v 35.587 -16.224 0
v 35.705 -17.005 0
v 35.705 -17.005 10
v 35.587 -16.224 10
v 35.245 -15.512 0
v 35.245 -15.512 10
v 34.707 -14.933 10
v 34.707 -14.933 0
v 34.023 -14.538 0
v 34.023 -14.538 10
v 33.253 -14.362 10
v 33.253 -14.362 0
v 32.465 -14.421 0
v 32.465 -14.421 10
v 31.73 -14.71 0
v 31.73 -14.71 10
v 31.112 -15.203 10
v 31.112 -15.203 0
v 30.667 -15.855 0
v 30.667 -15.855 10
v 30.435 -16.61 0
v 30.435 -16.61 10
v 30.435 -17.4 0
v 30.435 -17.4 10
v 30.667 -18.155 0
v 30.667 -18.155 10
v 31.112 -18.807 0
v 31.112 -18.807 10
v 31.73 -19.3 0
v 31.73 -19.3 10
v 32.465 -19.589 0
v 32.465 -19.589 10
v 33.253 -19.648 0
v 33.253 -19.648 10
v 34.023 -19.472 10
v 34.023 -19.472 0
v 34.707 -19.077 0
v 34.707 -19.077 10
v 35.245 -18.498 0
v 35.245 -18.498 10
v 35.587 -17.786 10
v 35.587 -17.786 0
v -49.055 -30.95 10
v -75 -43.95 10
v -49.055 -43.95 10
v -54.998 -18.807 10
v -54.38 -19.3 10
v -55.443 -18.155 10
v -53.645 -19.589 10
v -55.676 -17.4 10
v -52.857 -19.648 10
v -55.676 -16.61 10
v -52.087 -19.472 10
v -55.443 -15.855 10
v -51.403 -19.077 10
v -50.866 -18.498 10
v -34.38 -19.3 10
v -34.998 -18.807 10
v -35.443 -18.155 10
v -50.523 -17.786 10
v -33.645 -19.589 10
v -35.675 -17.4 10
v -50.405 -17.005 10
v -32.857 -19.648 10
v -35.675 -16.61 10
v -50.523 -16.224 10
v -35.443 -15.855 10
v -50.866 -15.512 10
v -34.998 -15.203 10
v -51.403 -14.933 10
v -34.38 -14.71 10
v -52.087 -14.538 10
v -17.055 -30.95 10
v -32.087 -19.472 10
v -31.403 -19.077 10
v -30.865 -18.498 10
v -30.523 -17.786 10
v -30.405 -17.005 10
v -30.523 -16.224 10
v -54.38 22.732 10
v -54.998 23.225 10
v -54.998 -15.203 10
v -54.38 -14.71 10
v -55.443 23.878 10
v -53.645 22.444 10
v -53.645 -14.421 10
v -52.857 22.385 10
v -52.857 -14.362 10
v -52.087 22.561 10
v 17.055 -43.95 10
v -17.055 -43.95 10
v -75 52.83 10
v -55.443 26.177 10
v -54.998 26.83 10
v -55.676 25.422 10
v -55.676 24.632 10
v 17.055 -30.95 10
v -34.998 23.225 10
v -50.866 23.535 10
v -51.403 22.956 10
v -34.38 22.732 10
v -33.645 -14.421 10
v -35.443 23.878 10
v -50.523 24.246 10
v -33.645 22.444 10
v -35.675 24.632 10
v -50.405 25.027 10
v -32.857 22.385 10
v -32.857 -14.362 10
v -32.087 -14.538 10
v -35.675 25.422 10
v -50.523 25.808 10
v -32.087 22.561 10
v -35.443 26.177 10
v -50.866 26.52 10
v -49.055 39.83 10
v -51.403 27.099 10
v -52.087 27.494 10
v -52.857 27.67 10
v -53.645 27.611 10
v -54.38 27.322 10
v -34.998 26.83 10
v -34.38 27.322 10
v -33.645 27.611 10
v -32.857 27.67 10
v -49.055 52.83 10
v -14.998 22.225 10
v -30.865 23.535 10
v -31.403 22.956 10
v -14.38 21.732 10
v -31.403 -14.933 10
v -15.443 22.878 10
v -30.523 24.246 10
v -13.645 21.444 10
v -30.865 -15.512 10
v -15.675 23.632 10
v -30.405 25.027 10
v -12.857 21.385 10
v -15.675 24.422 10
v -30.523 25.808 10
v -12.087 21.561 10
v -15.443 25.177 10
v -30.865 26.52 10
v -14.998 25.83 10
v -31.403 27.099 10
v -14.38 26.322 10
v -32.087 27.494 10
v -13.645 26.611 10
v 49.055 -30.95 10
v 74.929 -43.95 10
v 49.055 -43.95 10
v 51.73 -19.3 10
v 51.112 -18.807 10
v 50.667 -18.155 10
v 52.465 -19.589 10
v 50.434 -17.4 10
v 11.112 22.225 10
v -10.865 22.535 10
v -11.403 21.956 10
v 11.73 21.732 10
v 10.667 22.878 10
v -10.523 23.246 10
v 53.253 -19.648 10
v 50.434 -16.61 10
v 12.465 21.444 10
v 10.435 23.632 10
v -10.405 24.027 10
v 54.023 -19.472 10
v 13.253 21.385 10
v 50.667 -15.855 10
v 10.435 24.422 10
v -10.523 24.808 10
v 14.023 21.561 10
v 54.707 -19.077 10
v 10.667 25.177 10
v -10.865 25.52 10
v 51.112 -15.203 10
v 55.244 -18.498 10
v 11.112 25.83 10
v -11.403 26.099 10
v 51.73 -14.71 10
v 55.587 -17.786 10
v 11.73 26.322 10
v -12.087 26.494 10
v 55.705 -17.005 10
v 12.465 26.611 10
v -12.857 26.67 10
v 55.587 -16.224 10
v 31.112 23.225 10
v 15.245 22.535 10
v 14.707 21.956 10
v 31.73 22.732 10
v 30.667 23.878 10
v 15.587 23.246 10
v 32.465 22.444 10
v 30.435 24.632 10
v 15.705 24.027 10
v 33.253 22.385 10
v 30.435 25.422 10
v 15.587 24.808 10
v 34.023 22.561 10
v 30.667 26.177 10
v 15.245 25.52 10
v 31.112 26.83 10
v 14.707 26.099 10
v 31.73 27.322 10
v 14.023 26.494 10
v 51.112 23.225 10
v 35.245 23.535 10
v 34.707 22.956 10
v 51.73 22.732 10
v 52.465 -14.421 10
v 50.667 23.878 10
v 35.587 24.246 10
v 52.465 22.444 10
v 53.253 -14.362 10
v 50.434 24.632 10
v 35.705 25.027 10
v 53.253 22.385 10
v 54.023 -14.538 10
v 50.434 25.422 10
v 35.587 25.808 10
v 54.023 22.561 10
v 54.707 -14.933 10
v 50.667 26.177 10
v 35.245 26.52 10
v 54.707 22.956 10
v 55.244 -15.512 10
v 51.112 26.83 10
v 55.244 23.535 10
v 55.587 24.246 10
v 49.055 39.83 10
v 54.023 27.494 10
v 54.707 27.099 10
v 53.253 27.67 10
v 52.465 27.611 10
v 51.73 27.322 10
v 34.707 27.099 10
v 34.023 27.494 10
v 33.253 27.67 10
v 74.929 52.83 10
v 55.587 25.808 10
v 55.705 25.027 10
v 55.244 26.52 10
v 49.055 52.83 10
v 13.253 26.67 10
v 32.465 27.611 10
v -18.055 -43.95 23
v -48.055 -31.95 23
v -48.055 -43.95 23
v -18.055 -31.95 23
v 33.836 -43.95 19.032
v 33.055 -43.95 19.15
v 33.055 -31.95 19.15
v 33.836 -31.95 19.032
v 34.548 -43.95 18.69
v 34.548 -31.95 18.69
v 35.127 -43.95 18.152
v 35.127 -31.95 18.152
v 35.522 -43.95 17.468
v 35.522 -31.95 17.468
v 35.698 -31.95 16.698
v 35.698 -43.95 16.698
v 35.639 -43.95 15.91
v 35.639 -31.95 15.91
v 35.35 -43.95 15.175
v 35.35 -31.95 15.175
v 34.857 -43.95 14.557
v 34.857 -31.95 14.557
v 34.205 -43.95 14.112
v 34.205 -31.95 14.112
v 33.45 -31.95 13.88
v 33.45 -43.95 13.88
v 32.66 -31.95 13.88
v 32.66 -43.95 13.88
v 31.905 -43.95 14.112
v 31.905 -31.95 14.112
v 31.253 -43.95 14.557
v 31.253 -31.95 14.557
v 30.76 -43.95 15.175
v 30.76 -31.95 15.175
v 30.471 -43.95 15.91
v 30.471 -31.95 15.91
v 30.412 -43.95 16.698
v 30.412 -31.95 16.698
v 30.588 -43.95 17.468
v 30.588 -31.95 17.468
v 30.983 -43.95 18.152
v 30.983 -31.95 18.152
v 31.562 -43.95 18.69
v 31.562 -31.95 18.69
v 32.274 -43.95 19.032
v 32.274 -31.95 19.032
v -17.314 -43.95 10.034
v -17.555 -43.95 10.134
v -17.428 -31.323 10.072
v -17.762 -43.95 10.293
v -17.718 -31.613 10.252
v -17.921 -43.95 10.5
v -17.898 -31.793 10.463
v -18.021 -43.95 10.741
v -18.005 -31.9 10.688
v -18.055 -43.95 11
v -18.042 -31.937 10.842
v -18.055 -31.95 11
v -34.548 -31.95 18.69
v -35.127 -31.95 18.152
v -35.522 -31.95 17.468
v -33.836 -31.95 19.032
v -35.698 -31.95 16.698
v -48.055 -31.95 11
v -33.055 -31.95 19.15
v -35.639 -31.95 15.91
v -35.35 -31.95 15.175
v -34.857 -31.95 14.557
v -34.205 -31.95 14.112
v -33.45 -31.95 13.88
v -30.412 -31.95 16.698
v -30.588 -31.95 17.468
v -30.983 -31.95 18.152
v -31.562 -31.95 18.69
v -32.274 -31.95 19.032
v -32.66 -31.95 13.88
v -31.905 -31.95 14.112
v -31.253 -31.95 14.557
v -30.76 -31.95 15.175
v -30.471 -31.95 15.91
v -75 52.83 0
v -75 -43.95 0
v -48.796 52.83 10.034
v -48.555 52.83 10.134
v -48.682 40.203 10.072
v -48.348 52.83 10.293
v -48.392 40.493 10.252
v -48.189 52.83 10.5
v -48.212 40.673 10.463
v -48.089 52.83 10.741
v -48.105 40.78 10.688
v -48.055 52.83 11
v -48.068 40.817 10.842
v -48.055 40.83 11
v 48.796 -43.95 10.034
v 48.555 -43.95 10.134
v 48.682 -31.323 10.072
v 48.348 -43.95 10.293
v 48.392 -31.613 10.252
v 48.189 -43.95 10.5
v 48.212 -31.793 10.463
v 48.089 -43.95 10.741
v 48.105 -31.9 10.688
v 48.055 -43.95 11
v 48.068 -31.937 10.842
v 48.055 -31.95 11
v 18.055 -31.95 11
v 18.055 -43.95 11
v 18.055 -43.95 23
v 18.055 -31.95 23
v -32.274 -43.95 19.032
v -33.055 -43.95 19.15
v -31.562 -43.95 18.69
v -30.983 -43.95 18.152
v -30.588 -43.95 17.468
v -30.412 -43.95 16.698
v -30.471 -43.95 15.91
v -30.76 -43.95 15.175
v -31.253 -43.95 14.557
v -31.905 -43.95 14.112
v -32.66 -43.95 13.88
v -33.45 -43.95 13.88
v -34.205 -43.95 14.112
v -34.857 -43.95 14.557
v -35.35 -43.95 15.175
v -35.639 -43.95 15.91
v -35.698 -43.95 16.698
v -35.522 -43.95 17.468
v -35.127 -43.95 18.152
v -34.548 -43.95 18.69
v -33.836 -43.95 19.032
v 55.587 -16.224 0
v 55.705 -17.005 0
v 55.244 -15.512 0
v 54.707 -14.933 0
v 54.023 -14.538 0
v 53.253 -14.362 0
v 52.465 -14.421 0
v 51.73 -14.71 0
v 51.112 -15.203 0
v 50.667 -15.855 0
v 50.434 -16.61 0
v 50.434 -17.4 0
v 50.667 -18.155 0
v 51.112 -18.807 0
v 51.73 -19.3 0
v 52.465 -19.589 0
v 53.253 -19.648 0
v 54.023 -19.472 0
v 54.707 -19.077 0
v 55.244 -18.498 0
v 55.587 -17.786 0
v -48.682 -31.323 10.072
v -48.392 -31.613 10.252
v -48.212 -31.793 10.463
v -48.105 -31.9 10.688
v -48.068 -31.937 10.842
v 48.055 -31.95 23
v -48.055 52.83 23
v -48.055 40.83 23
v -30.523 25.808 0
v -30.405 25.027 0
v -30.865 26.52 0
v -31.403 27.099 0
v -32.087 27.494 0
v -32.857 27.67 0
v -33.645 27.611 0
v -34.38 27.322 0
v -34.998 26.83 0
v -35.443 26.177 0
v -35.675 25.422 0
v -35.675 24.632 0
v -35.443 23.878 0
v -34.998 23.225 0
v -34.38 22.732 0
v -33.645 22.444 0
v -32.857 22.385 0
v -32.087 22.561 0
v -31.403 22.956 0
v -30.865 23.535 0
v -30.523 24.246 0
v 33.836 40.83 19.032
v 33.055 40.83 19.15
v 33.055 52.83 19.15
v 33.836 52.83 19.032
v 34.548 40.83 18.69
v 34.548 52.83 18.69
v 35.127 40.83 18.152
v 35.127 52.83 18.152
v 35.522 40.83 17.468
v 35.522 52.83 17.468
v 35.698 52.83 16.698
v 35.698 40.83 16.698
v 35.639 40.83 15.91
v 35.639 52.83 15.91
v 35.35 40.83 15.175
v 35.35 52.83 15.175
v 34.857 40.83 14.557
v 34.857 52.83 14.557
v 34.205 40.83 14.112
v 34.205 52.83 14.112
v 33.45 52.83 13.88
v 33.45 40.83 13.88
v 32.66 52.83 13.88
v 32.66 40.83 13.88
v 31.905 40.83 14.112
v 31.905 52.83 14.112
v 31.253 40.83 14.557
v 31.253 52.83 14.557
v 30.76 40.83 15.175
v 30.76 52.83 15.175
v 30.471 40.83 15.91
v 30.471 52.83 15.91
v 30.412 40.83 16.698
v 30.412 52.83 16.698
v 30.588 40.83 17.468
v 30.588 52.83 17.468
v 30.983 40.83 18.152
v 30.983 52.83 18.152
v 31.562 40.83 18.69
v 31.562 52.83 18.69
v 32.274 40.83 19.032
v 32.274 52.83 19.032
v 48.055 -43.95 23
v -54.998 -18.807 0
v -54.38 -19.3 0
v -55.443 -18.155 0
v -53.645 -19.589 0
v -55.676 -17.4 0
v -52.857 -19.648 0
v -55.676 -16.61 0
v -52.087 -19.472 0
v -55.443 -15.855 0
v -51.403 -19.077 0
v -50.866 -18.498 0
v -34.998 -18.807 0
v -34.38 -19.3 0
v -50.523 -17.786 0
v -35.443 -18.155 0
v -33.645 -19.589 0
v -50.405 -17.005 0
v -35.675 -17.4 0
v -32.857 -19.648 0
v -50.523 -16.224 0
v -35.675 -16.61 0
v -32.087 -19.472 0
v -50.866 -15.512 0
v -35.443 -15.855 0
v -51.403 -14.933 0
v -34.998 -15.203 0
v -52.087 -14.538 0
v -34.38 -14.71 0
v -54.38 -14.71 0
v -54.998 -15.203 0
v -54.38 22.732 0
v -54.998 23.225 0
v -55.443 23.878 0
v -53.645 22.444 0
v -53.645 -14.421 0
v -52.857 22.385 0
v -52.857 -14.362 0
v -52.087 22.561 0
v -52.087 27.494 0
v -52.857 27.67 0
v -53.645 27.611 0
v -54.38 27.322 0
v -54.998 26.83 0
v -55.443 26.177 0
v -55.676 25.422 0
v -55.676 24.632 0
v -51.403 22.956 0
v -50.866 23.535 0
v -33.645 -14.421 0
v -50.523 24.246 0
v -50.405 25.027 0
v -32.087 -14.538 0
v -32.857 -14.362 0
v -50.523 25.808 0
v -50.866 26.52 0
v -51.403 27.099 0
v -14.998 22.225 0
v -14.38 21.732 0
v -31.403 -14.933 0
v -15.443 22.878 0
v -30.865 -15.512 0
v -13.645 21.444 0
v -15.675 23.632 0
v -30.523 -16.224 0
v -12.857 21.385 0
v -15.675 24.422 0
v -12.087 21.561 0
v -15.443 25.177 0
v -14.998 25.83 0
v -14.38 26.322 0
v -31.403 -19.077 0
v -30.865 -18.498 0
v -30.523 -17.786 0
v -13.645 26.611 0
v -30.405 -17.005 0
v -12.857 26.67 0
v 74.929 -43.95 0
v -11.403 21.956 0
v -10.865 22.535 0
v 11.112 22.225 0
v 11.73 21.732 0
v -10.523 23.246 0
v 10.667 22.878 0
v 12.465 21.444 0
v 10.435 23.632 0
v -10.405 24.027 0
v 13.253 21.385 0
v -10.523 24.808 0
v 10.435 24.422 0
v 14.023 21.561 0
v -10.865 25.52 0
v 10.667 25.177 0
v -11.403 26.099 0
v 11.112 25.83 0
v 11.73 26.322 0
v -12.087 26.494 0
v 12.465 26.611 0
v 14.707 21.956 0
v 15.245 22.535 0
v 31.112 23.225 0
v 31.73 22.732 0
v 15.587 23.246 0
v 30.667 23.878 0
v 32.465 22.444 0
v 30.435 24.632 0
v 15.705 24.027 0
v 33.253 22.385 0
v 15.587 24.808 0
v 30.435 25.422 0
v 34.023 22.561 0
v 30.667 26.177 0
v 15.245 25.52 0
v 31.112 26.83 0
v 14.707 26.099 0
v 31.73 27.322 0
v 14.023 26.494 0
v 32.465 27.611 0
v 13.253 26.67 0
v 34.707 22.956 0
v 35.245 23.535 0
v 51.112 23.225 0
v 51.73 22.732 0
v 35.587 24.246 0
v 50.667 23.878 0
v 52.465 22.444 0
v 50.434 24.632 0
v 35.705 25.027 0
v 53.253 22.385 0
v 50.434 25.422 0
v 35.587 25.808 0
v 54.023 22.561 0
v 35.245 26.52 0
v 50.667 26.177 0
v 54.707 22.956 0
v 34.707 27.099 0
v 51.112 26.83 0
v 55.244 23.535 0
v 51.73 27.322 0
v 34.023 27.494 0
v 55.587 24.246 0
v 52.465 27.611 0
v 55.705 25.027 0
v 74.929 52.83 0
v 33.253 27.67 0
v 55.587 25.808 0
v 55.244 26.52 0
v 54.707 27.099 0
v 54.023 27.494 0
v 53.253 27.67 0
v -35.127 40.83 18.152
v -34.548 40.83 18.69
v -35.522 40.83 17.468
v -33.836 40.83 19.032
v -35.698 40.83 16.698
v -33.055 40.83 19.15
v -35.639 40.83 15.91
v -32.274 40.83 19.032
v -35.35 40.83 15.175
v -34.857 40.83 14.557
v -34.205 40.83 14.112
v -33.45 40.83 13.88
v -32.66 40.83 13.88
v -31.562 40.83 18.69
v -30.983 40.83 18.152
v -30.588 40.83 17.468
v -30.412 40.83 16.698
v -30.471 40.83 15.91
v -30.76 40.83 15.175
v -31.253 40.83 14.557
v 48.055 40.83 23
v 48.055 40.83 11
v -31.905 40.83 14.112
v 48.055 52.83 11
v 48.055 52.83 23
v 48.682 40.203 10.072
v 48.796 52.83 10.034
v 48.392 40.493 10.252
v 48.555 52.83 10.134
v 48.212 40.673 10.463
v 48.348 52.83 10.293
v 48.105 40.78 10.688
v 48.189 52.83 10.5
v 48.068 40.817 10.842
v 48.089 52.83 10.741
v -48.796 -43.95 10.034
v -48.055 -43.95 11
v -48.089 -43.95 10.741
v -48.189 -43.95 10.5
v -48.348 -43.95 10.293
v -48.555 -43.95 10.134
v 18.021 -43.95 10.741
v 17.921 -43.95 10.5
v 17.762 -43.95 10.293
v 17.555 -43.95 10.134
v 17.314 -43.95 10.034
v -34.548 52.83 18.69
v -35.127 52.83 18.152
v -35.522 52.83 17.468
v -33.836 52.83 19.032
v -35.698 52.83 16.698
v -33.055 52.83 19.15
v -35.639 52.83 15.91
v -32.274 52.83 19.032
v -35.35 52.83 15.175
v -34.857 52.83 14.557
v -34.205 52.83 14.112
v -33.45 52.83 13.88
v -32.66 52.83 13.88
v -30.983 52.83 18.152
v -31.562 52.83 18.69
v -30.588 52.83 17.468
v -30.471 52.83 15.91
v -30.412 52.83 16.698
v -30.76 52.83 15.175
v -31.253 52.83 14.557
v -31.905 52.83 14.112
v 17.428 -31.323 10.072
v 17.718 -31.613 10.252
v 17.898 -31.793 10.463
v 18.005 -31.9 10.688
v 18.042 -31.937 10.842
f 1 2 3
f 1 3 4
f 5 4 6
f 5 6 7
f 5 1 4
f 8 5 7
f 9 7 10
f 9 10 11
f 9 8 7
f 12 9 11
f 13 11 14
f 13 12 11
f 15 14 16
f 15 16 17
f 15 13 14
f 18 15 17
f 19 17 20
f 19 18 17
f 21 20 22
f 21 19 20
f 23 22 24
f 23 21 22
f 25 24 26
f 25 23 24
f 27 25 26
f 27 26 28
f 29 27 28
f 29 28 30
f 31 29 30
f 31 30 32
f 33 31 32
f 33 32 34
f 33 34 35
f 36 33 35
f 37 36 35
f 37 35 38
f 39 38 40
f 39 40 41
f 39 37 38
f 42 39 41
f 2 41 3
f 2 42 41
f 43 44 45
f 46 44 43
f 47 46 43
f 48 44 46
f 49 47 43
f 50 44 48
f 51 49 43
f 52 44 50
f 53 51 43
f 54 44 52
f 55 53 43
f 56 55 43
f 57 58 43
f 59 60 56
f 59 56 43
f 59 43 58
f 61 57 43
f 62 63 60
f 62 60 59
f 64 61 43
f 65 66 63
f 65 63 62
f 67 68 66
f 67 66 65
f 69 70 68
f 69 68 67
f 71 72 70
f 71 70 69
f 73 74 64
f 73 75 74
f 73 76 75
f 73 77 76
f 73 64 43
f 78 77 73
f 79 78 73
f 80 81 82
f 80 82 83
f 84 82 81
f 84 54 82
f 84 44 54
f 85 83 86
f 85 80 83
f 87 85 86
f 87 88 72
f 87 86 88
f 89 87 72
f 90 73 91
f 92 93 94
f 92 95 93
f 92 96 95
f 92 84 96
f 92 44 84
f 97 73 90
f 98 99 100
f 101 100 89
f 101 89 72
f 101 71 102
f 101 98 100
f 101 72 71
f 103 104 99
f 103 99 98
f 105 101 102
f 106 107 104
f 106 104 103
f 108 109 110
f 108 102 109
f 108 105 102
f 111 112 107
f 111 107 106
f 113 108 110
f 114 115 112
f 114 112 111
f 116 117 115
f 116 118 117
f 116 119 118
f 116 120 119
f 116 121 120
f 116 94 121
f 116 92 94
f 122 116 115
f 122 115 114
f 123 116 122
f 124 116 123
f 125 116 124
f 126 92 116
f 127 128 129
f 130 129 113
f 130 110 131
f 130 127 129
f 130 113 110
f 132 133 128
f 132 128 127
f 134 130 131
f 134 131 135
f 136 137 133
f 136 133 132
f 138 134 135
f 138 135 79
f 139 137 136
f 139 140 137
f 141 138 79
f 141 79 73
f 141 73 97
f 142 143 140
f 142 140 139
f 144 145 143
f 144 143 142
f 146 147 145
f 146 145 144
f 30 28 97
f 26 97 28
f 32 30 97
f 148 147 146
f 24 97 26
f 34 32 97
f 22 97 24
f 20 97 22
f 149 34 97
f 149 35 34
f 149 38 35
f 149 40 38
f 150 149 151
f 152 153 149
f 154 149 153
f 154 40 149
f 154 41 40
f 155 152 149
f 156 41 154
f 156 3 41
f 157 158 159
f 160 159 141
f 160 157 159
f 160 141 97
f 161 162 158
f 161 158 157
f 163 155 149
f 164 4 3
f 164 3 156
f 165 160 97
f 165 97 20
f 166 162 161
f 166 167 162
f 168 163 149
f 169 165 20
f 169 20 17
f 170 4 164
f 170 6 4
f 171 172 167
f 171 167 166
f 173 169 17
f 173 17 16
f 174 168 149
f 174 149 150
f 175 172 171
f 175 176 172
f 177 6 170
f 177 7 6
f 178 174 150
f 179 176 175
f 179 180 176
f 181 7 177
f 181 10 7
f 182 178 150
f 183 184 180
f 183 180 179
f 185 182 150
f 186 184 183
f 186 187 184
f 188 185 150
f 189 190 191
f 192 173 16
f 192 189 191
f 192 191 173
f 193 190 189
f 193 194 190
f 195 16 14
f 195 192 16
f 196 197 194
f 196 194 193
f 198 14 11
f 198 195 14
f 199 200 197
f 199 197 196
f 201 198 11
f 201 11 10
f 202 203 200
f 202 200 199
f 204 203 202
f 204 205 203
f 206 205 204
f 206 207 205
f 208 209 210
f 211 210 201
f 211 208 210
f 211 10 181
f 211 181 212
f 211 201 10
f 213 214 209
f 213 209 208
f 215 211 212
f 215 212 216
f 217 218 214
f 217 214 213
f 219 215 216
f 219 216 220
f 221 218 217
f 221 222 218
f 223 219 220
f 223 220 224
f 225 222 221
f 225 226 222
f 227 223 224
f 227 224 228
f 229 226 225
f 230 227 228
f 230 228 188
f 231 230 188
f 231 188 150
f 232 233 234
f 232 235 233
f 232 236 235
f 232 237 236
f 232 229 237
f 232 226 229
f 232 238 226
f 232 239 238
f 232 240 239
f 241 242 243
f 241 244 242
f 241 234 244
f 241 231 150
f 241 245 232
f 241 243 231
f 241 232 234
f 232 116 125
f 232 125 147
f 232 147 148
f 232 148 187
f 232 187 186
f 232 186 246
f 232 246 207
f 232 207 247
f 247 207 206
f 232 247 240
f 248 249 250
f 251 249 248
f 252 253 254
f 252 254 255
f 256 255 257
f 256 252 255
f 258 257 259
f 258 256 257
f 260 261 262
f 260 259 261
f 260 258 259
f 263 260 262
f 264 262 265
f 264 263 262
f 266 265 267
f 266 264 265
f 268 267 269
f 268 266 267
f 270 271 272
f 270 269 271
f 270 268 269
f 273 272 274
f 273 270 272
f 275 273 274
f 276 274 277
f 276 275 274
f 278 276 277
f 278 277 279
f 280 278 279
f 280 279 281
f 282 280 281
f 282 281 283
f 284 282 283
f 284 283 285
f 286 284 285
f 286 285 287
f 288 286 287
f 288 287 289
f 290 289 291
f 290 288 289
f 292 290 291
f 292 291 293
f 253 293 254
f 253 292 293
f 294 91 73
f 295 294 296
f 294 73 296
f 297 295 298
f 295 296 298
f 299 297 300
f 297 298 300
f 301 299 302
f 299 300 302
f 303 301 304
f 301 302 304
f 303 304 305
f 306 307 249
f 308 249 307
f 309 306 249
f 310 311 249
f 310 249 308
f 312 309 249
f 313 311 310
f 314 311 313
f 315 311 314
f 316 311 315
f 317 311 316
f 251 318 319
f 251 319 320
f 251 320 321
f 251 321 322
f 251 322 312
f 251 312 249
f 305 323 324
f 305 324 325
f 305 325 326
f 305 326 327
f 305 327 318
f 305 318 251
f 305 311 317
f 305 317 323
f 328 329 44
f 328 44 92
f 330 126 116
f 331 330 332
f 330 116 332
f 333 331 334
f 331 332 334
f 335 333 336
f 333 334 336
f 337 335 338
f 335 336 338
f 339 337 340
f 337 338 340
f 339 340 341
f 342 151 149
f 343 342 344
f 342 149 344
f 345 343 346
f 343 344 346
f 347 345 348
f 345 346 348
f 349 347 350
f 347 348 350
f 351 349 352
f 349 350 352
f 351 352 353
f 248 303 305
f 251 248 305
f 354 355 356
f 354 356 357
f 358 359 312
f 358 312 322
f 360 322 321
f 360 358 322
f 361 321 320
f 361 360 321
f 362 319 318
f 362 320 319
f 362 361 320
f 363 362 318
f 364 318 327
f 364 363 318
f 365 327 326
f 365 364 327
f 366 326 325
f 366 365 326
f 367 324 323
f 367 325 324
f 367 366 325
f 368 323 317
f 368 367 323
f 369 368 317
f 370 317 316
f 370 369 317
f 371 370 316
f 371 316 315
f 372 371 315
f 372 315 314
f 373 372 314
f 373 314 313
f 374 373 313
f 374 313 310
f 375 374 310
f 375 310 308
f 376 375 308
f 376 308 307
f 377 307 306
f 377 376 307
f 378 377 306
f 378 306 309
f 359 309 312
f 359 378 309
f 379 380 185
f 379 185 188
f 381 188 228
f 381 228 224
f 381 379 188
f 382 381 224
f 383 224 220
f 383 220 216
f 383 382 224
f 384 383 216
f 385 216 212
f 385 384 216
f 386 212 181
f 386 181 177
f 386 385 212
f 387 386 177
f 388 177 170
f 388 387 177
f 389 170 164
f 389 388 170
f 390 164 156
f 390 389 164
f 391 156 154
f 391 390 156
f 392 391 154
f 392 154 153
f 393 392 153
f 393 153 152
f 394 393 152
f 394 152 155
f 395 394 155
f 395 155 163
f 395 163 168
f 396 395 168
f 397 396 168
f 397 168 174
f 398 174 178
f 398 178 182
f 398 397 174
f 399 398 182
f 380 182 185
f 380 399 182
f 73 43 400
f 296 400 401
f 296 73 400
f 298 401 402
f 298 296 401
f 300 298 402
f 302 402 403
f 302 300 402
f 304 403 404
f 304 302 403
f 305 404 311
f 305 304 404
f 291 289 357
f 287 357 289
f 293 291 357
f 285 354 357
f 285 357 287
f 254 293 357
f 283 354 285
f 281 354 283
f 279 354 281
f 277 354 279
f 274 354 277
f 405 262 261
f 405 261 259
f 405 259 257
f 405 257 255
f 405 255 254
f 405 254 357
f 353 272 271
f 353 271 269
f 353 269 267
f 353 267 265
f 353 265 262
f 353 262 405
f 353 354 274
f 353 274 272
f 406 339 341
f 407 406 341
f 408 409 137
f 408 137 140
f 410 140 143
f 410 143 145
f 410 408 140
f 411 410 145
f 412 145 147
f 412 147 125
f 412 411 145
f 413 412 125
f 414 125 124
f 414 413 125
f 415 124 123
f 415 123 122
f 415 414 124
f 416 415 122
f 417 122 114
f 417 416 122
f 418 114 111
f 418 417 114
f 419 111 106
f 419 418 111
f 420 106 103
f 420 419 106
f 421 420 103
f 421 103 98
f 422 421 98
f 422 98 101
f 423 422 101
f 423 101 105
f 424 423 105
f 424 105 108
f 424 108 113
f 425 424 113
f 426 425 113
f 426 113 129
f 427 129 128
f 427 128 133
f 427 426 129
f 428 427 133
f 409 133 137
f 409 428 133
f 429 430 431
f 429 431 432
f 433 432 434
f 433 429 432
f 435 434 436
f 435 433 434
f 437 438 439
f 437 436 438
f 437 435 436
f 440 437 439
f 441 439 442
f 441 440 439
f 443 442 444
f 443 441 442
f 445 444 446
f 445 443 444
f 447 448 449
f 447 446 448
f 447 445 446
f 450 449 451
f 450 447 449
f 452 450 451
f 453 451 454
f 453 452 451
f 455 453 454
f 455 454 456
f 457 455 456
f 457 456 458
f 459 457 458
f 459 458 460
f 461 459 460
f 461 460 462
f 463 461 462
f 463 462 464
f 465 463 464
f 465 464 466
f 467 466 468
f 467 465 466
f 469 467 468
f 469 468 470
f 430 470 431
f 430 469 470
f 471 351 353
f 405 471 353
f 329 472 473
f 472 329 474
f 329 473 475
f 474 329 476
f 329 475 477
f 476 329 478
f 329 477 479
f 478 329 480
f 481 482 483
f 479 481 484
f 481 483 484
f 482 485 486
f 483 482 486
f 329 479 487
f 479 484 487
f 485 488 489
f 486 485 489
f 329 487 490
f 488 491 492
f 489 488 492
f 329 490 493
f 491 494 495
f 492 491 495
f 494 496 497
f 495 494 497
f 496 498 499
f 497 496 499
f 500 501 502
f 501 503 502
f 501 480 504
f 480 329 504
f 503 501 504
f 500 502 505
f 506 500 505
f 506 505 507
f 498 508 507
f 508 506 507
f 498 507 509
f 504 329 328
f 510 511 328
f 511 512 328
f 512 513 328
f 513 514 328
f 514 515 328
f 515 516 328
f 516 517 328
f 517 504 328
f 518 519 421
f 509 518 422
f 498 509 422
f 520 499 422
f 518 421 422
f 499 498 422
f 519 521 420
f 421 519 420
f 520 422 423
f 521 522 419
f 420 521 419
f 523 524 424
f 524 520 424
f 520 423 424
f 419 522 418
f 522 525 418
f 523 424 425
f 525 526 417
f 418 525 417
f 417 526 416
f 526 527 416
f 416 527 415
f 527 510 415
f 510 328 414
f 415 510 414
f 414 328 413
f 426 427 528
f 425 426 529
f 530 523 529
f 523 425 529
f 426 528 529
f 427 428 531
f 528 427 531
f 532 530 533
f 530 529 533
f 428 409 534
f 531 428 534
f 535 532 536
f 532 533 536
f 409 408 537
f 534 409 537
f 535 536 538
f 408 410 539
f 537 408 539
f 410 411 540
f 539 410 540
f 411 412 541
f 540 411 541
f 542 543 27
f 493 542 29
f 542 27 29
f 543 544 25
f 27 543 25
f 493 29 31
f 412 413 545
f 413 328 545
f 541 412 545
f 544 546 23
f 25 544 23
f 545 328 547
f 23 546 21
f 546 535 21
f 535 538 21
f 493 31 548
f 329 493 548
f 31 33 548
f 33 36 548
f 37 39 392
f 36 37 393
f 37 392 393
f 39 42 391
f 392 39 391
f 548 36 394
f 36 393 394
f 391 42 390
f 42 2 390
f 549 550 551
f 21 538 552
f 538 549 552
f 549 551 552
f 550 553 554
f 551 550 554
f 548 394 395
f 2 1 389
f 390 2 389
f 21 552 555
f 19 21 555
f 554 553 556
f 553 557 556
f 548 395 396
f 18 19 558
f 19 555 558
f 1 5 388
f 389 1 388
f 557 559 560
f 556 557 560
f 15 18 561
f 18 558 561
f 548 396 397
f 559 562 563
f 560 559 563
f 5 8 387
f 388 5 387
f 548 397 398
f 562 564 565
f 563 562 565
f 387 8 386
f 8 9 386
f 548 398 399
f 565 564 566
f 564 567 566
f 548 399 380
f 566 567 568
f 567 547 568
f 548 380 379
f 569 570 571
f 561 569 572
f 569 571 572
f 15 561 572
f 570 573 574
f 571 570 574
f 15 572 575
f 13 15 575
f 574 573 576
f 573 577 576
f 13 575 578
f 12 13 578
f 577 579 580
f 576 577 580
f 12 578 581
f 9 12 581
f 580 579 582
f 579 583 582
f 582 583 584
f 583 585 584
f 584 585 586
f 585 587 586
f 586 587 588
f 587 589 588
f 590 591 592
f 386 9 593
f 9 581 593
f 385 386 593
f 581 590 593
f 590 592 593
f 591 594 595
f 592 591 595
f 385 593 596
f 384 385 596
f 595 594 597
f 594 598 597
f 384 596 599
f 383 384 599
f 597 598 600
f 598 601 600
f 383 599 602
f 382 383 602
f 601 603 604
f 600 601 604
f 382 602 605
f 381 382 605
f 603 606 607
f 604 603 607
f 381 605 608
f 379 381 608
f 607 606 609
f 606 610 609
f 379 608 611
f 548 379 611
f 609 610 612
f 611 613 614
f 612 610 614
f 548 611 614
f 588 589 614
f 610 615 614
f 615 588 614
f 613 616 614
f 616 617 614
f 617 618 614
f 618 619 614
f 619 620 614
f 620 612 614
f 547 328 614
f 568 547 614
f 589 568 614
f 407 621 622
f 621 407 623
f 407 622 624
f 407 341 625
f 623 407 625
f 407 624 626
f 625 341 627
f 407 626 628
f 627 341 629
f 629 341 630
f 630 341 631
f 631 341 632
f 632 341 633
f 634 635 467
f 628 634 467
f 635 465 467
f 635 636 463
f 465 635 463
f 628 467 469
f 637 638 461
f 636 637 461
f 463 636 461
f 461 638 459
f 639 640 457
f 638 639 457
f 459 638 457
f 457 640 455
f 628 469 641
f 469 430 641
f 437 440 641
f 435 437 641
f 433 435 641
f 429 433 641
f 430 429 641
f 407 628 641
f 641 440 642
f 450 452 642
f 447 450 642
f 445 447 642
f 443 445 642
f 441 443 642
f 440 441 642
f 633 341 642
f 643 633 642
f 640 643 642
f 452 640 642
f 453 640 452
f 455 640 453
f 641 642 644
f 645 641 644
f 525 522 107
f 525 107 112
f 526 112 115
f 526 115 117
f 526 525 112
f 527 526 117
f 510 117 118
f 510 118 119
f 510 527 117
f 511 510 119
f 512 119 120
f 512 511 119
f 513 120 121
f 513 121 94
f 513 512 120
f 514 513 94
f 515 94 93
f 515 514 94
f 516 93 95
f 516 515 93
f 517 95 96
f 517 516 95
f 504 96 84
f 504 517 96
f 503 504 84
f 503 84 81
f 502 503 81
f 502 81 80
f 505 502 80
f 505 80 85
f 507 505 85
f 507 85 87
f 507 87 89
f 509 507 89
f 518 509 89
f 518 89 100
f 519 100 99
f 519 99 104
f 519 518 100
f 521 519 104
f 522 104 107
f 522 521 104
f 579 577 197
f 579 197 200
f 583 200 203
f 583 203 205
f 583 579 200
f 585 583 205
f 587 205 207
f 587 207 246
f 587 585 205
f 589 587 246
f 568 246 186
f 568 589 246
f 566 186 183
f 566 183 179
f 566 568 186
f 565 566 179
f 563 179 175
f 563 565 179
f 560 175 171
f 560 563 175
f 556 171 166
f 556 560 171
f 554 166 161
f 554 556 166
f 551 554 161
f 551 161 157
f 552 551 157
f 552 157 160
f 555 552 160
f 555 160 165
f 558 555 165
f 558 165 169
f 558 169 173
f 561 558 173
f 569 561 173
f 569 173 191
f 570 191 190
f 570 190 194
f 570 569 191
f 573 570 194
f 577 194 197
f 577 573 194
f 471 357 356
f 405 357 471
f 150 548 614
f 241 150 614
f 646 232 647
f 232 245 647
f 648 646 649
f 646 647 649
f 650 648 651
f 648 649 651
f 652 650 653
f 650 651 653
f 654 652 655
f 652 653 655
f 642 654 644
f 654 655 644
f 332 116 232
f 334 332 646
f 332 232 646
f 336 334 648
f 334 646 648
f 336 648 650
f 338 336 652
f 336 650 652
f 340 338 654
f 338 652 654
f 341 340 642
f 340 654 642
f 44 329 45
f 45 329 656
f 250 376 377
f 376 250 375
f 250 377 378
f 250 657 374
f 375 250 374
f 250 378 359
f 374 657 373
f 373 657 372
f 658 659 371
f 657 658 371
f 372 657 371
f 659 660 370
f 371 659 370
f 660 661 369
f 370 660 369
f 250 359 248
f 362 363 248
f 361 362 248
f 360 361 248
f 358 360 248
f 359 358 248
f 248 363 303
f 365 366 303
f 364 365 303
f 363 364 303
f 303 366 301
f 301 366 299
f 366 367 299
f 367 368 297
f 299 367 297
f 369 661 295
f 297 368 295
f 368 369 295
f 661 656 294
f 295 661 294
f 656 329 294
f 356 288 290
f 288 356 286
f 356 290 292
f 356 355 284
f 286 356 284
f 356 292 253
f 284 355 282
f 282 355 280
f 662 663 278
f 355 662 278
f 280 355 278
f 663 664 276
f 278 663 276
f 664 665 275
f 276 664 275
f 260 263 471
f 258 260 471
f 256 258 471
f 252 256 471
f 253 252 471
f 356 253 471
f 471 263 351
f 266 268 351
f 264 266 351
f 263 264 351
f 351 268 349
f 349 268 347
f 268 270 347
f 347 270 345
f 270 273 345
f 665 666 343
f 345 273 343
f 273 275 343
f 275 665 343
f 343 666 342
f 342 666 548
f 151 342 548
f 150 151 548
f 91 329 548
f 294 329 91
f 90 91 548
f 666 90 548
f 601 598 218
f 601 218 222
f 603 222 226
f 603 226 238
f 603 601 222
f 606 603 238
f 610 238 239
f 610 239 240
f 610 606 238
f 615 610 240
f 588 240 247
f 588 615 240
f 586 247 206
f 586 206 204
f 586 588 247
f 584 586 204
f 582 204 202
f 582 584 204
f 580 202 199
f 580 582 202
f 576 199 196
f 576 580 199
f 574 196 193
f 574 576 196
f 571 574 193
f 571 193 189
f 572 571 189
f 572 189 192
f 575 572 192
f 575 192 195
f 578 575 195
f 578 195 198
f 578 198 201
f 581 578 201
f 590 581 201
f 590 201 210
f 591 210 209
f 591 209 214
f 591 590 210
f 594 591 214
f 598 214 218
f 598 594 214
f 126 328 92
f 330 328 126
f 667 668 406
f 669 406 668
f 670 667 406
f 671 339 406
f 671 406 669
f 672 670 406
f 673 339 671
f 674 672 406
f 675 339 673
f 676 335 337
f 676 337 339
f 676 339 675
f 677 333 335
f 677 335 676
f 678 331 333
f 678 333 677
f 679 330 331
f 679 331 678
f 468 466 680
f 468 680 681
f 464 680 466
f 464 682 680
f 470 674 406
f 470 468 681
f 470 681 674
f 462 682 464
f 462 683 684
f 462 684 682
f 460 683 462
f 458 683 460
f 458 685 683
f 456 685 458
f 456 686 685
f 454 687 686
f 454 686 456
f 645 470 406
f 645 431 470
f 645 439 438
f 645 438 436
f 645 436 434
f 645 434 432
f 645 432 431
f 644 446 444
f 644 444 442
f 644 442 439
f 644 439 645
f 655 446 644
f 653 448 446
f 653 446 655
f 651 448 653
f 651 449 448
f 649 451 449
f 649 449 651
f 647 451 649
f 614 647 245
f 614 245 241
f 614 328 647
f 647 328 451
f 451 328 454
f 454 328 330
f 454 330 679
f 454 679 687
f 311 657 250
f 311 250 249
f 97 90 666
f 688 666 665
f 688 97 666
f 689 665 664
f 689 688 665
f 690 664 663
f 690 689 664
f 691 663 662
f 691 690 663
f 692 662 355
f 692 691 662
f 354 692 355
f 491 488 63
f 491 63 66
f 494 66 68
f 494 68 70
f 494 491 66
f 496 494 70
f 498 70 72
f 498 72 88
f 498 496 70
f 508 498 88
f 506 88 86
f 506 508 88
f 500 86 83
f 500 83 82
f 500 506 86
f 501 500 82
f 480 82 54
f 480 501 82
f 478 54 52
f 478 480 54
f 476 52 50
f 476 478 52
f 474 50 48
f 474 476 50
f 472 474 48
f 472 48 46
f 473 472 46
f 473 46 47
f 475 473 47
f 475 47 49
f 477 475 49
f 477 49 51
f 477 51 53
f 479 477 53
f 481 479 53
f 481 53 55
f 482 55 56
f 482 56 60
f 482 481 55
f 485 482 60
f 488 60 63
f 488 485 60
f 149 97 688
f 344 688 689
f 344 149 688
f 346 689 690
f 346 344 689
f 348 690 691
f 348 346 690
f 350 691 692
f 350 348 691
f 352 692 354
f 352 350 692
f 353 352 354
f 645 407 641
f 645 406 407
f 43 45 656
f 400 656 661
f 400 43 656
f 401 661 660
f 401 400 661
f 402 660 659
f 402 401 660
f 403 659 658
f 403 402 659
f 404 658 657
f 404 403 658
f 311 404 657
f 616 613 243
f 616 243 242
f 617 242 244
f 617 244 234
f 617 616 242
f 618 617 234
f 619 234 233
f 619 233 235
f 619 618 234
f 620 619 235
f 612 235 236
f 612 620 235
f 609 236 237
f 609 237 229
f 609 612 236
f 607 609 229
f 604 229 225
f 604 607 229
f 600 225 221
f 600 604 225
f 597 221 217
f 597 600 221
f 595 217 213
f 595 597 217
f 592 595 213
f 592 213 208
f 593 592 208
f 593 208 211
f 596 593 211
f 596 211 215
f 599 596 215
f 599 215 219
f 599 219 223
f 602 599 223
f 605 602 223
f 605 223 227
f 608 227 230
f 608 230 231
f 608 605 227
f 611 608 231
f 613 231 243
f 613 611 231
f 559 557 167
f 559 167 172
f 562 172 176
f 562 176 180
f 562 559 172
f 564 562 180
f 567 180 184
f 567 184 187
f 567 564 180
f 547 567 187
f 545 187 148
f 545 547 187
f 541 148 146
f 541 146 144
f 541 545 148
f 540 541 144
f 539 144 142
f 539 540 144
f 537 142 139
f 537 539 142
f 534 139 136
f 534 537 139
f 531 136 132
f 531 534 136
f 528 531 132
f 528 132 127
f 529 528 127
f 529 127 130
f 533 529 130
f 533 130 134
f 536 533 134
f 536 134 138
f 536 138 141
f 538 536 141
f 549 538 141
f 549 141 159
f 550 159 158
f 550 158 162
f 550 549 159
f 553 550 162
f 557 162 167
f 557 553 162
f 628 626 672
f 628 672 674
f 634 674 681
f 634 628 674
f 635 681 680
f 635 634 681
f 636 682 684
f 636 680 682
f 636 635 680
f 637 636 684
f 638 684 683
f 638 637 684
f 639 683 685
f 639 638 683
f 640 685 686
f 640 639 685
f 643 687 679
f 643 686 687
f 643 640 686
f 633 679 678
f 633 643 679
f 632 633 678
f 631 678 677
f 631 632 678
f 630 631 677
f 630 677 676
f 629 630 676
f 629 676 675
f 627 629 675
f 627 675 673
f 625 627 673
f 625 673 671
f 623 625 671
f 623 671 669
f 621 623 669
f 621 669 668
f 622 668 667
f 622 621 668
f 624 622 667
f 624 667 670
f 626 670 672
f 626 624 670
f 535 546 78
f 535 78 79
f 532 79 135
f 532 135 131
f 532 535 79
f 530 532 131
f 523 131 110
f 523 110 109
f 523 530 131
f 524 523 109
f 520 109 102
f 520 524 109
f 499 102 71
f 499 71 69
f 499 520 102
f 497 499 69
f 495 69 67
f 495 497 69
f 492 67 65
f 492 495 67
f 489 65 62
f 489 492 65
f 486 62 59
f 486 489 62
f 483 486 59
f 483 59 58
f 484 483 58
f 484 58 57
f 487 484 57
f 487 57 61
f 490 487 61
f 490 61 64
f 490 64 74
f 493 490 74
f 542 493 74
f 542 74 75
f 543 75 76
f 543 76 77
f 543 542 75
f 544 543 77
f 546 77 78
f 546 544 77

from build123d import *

# Parameters (mm, degrees)
SKETCH3_W               = 149.929020718
SKETCH3_H               = 96.78
SKETCH3_R               = 2.65
BOSS_EXTRUDE1_DEPTH     = 10
SKETCH4_W               = 30
SKETCH4_H               = 12
BOSS_EXTRUDE4_DEPTH     = 13
CUT_EXTRUDE1_DEPTH      = 116.506286536
CUT_EXTRUDE1_DEPTH_BACK = 116.506286536
SKETCH5_R               = 2.65
FILLET1_R               = 1


with BuildPart() as part:
    # Sketch3 → Boss-Extrude1 (new body)
    with BuildSketch(Plane.XY):
        with Locations((-0.035848502, 4.44)):
            Rectangle(SKETCH3_W, SKETCH3_H)
        with Locations((-53.055358861, -17.005)):
            Circle(SKETCH3_R, mode=Mode.SUBTRACT)
        with Locations((-33.055, -17.005)):
            Circle(SKETCH3_R, mode=Mode.SUBTRACT)
        with Locations((33.055, -17.005)):
            Circle(SKETCH3_R, mode=Mode.SUBTRACT)
        with Locations((53.054641139, -17.005)):
            Circle(SKETCH3_R, mode=Mode.SUBTRACT)
        with Locations((-13.055, 24.027361408)):
            Circle(SKETCH3_R, mode=Mode.SUBTRACT)
        with Locations((13.055, 24.027361408)):
            Circle(SKETCH3_R, mode=Mode.SUBTRACT)
        with Locations((-53.055358861, 25.027361408)):
            Circle(SKETCH3_R, mode=Mode.SUBTRACT)
        with Locations((-33.055, 25.027361408)):
            Circle(SKETCH3_R, mode=Mode.SUBTRACT)
        with Locations((33.055, 25.027361408)):
            Circle(SKETCH3_R, mode=Mode.SUBTRACT)
        with Locations((53.054641139, 25.027361408)):
            Circle(SKETCH3_R, mode=Mode.SUBTRACT)
    extrude(amount=BOSS_EXTRUDE1_DEPTH)

    # Sketch4 → Boss-Extrude4 (add)
    with BuildSketch(Plane.XY.offset(10)):
        with Locations((-33.055, -37.95)):
            Rectangle(SKETCH4_W, SKETCH4_H)
        Polygon((-48.055, 40.83), (-18.055, 40.83), (18.055, 40.83), (48.055, 40.83), (48.055, 52.83), (18.055, 52.83), (-18.055, 52.83), (-48.055, 52.83), align=None)
        with Locations((33.055, -37.95)):
            Rectangle(SKETCH4_W, SKETCH4_H)
    extrude(amount=BOSS_EXTRUDE4_DEPTH)

    # Sketch5 → Cut-Extrude1 (cut, two sides: drawn at the far end of the back side and taken through both)
    with BuildSketch(Plane(origin=(0, -31.95, 0), x_dir=(1, 0, 0), z_dir=(0, 1, 0)).offset(-CUT_EXTRUDE1_DEPTH_BACK)):
        with Locations(Location((33.055, -16.5, 0), (0, 0, 270))):
            Circle(SKETCH5_R)
        with Locations(Location((-33.055, -16.5, 0), (0, 0, 270))):
            Circle(SKETCH5_R)
    extrude(amount=CUT_EXTRUDE1_DEPTH + CUT_EXTRUDE1_DEPTH_BACK, mode=Mode.SUBTRACT)

    # Fillet1
    fillet1_edges = [part.edges().sort_by_distance(p)[0] for p in [
        (-48.055, 46.83, 10),
        (48.055, 46.83, 10),
        (0, 40.83, 10),
        (-18.055, -37.95, 10),
        (-33.055, -31.95, 10),
        (-48.055, -37.95, 10),
        (48.055, -37.95, 10),
        (33.055, -31.95, 10),
        (18.055, -37.95, 10),
    ]]
    fillet(fillet1_edges, radius=FILLET1_R)


solid = part.part
